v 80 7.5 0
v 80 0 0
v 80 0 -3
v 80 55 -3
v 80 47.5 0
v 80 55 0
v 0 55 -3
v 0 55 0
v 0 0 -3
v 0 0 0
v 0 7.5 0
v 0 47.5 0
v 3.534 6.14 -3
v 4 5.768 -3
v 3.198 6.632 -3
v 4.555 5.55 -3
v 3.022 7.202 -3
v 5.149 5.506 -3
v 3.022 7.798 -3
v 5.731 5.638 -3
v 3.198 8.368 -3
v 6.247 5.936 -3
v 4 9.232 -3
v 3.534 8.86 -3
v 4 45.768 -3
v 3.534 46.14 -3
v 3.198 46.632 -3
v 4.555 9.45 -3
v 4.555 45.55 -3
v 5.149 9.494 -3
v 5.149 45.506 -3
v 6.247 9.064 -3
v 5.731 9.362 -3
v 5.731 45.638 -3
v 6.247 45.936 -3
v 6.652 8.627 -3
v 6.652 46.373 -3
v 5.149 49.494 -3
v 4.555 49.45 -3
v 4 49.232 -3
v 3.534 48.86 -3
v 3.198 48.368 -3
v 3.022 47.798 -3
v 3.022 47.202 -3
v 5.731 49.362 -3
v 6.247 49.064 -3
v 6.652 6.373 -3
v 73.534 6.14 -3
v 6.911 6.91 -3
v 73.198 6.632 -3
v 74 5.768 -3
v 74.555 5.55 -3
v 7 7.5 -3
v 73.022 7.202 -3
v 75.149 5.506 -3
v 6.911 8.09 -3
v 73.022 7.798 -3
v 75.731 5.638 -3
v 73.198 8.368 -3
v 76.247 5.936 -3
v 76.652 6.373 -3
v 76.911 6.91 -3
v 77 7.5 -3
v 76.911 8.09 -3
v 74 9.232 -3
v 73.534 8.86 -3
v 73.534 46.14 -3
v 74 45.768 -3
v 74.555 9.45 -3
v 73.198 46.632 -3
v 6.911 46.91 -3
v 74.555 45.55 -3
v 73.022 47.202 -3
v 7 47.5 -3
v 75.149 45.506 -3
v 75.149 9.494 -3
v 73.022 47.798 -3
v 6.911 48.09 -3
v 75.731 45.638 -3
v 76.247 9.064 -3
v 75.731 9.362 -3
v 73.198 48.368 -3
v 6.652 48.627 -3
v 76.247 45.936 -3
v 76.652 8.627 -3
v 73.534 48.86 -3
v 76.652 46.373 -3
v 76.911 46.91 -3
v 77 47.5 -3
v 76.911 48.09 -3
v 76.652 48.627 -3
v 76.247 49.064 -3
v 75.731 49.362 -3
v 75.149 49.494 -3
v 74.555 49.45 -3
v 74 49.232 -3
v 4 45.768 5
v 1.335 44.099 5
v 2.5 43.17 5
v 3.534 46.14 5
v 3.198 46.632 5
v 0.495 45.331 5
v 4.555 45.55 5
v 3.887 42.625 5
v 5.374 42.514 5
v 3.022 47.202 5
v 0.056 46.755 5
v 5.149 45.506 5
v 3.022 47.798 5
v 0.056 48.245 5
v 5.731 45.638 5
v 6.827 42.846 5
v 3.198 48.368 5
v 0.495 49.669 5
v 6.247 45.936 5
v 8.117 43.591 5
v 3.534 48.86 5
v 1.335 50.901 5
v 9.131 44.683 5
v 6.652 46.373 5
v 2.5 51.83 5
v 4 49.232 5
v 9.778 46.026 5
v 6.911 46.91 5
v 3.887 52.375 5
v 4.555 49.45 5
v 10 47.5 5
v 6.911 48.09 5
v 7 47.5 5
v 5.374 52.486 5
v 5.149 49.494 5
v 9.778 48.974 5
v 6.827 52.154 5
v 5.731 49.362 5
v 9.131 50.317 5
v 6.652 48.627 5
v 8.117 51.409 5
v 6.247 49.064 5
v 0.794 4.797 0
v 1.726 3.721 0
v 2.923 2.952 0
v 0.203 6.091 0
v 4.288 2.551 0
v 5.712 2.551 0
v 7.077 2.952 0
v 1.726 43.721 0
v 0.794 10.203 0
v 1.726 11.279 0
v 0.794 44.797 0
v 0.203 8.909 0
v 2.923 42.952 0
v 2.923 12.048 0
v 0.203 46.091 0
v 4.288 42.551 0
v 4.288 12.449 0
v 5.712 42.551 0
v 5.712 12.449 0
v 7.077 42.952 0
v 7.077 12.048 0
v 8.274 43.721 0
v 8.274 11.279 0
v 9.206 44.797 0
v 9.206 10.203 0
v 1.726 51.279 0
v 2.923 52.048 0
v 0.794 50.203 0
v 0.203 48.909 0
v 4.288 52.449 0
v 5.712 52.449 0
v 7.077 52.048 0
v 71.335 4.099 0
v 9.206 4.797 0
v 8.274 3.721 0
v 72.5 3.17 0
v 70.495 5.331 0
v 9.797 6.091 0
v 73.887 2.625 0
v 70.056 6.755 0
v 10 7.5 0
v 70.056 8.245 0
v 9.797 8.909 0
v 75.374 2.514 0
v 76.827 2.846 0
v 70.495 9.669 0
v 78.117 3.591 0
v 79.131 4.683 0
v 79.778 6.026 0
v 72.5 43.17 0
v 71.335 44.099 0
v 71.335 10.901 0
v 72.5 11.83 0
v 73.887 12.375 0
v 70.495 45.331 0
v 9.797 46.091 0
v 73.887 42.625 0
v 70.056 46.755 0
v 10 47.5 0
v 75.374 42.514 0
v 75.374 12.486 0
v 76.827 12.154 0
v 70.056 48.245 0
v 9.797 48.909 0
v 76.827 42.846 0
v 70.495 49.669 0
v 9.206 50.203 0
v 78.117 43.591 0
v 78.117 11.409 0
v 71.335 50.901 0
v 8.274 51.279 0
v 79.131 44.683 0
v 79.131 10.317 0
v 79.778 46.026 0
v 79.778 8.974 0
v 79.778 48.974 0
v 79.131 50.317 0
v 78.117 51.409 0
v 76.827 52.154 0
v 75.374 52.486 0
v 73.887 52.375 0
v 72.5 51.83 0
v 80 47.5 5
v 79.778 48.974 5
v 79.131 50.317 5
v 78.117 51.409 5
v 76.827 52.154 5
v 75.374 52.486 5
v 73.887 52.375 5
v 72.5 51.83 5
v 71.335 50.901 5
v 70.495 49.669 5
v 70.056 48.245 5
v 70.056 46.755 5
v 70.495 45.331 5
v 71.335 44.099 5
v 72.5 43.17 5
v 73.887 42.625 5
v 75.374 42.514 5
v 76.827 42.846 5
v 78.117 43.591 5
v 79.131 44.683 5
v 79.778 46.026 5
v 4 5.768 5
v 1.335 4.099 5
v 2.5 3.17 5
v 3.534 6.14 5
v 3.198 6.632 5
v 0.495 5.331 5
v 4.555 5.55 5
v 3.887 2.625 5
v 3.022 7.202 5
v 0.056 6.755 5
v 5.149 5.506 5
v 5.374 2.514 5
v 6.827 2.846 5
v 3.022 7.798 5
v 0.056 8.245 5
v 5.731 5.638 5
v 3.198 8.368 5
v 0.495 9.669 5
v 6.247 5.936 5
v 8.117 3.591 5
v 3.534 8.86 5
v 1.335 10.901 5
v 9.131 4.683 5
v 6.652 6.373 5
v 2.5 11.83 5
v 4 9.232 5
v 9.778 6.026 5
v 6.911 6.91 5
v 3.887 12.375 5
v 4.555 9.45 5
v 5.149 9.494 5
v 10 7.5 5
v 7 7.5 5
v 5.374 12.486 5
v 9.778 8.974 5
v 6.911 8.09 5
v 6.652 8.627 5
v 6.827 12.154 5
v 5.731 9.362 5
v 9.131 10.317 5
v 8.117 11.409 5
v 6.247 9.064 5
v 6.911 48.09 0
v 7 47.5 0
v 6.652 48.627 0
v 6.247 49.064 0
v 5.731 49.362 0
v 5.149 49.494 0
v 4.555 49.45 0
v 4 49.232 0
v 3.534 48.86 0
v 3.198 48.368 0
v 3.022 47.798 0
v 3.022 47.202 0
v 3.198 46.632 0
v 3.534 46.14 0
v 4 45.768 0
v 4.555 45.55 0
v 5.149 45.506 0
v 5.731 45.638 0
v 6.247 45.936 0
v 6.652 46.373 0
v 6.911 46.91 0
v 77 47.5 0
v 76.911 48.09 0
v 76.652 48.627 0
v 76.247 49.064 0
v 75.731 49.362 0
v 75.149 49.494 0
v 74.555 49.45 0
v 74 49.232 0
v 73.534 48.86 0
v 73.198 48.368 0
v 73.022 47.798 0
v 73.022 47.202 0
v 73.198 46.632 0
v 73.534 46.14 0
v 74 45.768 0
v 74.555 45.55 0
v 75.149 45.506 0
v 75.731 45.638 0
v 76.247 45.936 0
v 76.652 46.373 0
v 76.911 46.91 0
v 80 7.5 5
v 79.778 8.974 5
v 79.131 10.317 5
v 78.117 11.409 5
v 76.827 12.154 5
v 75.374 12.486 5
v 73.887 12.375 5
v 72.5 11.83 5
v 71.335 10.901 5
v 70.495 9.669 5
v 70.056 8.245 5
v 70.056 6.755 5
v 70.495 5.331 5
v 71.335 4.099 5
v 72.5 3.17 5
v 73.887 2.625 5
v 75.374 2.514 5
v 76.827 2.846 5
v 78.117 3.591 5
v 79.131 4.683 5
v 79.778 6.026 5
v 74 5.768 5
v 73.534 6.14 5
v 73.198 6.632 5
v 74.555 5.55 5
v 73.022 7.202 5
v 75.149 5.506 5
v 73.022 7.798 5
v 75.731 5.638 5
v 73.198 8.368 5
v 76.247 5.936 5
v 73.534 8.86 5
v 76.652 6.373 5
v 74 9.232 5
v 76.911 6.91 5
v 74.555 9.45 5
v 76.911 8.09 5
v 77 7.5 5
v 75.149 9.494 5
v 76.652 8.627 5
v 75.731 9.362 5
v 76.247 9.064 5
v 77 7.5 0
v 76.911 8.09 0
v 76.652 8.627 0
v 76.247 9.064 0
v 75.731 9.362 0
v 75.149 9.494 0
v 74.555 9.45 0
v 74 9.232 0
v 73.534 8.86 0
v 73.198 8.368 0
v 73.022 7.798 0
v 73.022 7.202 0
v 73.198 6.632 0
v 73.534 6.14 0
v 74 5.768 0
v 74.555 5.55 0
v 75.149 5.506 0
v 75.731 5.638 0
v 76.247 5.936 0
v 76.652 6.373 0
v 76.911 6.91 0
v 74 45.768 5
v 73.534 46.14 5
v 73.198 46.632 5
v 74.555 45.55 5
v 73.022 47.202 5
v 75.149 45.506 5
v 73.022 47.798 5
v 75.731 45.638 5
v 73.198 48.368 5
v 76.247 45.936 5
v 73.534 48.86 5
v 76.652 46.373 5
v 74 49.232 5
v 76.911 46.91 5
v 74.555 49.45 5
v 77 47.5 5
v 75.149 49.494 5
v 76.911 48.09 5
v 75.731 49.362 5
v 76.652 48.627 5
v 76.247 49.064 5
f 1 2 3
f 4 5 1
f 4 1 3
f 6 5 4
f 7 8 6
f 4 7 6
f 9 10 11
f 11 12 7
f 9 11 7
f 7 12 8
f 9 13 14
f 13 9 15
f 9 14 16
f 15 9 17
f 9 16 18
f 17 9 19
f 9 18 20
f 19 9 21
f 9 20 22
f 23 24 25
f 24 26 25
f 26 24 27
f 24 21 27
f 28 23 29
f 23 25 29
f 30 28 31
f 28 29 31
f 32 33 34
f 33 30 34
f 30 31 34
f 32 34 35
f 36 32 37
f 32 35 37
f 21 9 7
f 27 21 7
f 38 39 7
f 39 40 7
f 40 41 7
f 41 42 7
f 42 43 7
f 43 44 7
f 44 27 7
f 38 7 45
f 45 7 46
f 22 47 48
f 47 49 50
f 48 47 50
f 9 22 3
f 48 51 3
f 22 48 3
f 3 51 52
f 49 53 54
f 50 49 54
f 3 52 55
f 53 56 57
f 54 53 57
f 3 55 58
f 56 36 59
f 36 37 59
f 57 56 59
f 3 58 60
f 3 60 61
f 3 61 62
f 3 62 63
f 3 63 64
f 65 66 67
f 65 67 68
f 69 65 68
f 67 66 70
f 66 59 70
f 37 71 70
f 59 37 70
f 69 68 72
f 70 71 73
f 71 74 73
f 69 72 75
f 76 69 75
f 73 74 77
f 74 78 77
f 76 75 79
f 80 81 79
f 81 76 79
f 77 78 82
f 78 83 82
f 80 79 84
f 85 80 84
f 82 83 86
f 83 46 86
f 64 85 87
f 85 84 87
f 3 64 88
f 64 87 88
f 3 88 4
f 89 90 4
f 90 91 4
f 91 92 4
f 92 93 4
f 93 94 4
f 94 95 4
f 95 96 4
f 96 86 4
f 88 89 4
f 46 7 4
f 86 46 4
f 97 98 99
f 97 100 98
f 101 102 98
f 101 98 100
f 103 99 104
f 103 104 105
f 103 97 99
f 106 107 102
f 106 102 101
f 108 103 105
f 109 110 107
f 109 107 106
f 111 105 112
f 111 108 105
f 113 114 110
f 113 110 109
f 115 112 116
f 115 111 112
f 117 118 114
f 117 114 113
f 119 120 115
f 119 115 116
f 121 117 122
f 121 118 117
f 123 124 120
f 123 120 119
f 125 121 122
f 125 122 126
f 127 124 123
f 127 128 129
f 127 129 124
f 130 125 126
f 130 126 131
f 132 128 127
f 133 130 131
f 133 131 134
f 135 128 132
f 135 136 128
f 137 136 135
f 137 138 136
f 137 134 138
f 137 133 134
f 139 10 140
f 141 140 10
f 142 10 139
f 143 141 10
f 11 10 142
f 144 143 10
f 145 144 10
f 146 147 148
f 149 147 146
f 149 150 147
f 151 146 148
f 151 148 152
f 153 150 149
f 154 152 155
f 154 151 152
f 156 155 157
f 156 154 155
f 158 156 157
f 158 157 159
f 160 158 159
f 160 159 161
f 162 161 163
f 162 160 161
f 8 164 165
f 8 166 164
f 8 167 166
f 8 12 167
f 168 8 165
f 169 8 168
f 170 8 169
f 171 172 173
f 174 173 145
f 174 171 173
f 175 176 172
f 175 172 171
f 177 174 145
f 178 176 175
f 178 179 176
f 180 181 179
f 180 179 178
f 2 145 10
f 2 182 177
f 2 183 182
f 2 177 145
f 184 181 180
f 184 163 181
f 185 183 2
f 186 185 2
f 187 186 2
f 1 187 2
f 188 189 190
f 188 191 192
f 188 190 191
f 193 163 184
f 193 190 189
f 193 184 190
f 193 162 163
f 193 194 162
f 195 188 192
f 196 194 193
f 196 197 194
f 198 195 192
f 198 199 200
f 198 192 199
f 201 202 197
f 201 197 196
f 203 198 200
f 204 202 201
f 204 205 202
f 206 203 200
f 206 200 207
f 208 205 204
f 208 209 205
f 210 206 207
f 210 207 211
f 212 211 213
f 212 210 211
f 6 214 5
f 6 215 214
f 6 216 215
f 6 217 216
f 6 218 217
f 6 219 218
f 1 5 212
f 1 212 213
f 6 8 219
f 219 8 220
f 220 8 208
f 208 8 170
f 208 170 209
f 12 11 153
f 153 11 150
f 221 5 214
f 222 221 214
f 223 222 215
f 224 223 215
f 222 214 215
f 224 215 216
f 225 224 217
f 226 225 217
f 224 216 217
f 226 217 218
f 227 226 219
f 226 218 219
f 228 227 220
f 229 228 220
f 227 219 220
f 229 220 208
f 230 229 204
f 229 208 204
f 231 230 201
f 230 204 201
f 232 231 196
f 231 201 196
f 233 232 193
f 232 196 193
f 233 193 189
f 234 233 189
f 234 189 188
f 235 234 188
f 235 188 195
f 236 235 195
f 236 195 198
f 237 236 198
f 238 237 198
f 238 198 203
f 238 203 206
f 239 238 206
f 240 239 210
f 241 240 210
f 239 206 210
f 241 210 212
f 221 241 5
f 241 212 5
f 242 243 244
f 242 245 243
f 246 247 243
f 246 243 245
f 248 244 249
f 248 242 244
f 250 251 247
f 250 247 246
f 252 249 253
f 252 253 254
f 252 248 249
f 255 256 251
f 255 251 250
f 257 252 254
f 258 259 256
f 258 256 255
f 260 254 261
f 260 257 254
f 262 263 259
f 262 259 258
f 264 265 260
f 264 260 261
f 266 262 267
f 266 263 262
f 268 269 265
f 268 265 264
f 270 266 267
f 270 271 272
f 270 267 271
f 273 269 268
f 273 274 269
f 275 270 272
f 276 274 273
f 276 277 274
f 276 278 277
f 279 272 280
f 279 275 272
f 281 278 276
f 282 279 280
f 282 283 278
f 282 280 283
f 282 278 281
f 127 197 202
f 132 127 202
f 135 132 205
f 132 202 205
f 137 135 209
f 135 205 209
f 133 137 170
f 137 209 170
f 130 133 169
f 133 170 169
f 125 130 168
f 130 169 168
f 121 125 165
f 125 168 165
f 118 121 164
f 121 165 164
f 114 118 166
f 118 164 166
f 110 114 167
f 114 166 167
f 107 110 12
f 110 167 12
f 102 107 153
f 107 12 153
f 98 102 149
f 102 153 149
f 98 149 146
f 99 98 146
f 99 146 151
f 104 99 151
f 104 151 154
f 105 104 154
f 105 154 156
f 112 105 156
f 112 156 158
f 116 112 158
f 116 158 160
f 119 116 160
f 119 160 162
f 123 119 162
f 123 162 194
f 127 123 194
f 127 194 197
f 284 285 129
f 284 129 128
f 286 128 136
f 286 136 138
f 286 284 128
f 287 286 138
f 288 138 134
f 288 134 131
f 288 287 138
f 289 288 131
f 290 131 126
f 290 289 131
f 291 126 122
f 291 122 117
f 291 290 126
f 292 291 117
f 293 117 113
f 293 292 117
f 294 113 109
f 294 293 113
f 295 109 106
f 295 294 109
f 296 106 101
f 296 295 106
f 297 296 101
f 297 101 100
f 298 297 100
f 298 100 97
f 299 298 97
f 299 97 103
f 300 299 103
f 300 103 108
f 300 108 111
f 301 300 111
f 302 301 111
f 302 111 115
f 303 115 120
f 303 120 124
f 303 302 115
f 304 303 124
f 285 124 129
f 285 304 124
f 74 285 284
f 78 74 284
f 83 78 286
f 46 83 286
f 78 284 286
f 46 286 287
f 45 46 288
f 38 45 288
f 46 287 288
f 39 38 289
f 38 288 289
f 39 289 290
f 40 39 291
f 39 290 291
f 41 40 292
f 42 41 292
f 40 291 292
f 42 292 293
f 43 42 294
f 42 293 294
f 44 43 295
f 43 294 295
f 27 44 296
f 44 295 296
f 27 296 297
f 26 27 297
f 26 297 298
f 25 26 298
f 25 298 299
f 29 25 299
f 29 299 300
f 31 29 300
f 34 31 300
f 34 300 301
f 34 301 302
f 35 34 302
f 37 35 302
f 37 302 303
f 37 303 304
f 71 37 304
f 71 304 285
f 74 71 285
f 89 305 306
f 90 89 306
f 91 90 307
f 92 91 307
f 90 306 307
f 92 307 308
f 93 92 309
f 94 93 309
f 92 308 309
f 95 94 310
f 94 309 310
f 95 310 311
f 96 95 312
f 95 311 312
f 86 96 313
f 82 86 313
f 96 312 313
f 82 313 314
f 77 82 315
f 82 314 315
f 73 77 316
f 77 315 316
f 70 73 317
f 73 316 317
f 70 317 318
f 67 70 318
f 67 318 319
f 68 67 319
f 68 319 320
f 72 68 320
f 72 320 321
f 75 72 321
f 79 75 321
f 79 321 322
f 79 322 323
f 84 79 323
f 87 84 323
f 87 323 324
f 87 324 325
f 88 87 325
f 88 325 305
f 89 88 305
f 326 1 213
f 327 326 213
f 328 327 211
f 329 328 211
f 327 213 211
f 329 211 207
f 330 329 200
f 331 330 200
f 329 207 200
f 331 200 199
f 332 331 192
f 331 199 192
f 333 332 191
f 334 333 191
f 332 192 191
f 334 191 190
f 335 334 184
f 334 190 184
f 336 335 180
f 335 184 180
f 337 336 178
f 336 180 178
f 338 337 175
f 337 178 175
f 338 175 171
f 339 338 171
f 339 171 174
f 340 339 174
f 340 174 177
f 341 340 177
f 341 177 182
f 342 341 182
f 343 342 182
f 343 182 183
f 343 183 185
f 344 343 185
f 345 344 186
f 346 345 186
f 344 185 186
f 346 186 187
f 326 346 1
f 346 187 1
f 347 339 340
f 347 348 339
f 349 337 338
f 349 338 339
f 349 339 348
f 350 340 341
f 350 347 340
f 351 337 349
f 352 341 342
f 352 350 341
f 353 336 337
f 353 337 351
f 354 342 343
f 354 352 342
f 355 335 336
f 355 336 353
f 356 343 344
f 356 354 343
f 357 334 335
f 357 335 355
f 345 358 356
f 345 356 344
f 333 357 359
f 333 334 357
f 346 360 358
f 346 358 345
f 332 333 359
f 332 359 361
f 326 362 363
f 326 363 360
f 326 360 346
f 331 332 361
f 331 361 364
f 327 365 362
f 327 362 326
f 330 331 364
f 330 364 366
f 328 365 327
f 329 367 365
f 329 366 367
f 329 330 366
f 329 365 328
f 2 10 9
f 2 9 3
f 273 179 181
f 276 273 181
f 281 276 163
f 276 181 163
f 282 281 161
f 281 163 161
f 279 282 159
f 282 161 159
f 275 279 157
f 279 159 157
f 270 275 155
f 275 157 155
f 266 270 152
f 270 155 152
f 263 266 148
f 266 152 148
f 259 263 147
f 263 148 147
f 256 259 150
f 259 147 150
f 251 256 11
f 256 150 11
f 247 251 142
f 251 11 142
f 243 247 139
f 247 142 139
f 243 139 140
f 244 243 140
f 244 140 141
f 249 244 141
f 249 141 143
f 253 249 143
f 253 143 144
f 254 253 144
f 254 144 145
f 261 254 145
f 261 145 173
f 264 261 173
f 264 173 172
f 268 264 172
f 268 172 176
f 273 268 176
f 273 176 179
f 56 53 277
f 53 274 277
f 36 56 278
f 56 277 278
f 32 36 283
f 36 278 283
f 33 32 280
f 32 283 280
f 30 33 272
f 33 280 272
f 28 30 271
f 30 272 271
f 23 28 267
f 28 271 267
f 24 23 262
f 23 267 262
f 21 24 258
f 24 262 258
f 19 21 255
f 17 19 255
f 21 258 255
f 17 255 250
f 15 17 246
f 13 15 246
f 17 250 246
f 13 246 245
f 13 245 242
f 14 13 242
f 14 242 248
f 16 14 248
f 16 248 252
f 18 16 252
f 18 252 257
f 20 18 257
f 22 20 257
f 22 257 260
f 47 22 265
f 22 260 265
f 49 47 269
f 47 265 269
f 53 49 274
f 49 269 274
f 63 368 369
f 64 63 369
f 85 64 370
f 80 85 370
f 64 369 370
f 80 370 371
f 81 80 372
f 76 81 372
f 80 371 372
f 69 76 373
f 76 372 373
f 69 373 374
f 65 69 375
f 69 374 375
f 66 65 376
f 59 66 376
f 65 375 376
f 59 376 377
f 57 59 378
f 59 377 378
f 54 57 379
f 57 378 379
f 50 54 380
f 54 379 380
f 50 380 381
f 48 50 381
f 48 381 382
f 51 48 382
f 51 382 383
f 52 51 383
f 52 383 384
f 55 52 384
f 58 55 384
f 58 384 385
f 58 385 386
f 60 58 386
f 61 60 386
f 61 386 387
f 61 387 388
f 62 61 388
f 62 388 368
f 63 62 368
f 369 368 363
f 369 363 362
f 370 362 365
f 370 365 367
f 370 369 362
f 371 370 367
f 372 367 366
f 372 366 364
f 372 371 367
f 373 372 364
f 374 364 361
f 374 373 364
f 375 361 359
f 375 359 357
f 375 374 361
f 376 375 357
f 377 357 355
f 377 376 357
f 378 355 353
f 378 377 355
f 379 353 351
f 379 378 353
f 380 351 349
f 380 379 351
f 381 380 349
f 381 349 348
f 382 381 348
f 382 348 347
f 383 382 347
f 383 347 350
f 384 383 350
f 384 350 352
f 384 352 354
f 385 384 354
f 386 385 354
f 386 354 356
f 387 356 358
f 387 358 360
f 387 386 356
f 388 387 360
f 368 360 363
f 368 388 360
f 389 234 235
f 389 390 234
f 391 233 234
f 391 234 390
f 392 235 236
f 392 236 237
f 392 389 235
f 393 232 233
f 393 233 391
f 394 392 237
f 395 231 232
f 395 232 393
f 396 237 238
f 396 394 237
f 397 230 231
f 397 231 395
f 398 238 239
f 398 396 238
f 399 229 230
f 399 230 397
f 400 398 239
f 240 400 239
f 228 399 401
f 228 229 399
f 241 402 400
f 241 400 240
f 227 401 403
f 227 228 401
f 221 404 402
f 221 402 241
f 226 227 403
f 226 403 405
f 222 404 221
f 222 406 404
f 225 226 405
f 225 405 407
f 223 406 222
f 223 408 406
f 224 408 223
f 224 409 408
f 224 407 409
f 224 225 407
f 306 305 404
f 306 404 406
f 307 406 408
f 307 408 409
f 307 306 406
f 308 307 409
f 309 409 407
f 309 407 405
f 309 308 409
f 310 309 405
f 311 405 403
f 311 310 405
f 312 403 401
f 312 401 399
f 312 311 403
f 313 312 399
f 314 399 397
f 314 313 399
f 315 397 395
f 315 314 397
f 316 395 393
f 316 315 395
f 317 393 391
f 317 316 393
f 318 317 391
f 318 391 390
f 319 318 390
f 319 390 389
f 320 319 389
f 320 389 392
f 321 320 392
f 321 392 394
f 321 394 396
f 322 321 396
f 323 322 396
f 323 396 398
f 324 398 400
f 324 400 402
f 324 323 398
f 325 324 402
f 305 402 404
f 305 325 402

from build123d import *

# Parameters (mm, degrees)
SKETCH_W     = 80
SKETCH_H     = 55
PAD_DEPTH    = 3
SKETCH001_R  = 5
PAD001_DEPTH = 5
SKETCH002_R  = 2
POCKET_DEPTH = 5


with BuildPart() as part:
    # Sketch → Pad (new body)
    with BuildSketch(Plane.XY):
        with Locations((40, 27.5)):
            Rectangle(SKETCH_W, SKETCH_H)
    extrude(amount=-PAD_DEPTH)

    # Sketch001 → Pad001 (join)
    with BuildSketch(Plane.XY):
        with Locations((5, 47.5)):
            Circle(SKETCH001_R)
        with Locations((75, 47.5)):
            Circle(SKETCH001_R)
        with Locations((5, 7.5)):
            Circle(SKETCH001_R)
        with Locations((75, 7.5)):
            Circle(SKETCH001_R)
    extrude(amount=PAD001_DEPTH)

    # Sketch002 → Pocket (cut, symmetric)
    with BuildSketch(Plane.XY):
        with Locations((5, 47.5)):
            Circle(SKETCH002_R)
        with Locations((75, 47.5)):
            Circle(SKETCH002_R)
        with Locations((75, 7.5)):
            Circle(SKETCH002_R)
        with Locations((5, 7.5)):
            Circle(SKETCH002_R)
    extrude(amount=POCKET_DEPTH, both=True, mode=Mode.SUBTRACT)


solid = part.part
